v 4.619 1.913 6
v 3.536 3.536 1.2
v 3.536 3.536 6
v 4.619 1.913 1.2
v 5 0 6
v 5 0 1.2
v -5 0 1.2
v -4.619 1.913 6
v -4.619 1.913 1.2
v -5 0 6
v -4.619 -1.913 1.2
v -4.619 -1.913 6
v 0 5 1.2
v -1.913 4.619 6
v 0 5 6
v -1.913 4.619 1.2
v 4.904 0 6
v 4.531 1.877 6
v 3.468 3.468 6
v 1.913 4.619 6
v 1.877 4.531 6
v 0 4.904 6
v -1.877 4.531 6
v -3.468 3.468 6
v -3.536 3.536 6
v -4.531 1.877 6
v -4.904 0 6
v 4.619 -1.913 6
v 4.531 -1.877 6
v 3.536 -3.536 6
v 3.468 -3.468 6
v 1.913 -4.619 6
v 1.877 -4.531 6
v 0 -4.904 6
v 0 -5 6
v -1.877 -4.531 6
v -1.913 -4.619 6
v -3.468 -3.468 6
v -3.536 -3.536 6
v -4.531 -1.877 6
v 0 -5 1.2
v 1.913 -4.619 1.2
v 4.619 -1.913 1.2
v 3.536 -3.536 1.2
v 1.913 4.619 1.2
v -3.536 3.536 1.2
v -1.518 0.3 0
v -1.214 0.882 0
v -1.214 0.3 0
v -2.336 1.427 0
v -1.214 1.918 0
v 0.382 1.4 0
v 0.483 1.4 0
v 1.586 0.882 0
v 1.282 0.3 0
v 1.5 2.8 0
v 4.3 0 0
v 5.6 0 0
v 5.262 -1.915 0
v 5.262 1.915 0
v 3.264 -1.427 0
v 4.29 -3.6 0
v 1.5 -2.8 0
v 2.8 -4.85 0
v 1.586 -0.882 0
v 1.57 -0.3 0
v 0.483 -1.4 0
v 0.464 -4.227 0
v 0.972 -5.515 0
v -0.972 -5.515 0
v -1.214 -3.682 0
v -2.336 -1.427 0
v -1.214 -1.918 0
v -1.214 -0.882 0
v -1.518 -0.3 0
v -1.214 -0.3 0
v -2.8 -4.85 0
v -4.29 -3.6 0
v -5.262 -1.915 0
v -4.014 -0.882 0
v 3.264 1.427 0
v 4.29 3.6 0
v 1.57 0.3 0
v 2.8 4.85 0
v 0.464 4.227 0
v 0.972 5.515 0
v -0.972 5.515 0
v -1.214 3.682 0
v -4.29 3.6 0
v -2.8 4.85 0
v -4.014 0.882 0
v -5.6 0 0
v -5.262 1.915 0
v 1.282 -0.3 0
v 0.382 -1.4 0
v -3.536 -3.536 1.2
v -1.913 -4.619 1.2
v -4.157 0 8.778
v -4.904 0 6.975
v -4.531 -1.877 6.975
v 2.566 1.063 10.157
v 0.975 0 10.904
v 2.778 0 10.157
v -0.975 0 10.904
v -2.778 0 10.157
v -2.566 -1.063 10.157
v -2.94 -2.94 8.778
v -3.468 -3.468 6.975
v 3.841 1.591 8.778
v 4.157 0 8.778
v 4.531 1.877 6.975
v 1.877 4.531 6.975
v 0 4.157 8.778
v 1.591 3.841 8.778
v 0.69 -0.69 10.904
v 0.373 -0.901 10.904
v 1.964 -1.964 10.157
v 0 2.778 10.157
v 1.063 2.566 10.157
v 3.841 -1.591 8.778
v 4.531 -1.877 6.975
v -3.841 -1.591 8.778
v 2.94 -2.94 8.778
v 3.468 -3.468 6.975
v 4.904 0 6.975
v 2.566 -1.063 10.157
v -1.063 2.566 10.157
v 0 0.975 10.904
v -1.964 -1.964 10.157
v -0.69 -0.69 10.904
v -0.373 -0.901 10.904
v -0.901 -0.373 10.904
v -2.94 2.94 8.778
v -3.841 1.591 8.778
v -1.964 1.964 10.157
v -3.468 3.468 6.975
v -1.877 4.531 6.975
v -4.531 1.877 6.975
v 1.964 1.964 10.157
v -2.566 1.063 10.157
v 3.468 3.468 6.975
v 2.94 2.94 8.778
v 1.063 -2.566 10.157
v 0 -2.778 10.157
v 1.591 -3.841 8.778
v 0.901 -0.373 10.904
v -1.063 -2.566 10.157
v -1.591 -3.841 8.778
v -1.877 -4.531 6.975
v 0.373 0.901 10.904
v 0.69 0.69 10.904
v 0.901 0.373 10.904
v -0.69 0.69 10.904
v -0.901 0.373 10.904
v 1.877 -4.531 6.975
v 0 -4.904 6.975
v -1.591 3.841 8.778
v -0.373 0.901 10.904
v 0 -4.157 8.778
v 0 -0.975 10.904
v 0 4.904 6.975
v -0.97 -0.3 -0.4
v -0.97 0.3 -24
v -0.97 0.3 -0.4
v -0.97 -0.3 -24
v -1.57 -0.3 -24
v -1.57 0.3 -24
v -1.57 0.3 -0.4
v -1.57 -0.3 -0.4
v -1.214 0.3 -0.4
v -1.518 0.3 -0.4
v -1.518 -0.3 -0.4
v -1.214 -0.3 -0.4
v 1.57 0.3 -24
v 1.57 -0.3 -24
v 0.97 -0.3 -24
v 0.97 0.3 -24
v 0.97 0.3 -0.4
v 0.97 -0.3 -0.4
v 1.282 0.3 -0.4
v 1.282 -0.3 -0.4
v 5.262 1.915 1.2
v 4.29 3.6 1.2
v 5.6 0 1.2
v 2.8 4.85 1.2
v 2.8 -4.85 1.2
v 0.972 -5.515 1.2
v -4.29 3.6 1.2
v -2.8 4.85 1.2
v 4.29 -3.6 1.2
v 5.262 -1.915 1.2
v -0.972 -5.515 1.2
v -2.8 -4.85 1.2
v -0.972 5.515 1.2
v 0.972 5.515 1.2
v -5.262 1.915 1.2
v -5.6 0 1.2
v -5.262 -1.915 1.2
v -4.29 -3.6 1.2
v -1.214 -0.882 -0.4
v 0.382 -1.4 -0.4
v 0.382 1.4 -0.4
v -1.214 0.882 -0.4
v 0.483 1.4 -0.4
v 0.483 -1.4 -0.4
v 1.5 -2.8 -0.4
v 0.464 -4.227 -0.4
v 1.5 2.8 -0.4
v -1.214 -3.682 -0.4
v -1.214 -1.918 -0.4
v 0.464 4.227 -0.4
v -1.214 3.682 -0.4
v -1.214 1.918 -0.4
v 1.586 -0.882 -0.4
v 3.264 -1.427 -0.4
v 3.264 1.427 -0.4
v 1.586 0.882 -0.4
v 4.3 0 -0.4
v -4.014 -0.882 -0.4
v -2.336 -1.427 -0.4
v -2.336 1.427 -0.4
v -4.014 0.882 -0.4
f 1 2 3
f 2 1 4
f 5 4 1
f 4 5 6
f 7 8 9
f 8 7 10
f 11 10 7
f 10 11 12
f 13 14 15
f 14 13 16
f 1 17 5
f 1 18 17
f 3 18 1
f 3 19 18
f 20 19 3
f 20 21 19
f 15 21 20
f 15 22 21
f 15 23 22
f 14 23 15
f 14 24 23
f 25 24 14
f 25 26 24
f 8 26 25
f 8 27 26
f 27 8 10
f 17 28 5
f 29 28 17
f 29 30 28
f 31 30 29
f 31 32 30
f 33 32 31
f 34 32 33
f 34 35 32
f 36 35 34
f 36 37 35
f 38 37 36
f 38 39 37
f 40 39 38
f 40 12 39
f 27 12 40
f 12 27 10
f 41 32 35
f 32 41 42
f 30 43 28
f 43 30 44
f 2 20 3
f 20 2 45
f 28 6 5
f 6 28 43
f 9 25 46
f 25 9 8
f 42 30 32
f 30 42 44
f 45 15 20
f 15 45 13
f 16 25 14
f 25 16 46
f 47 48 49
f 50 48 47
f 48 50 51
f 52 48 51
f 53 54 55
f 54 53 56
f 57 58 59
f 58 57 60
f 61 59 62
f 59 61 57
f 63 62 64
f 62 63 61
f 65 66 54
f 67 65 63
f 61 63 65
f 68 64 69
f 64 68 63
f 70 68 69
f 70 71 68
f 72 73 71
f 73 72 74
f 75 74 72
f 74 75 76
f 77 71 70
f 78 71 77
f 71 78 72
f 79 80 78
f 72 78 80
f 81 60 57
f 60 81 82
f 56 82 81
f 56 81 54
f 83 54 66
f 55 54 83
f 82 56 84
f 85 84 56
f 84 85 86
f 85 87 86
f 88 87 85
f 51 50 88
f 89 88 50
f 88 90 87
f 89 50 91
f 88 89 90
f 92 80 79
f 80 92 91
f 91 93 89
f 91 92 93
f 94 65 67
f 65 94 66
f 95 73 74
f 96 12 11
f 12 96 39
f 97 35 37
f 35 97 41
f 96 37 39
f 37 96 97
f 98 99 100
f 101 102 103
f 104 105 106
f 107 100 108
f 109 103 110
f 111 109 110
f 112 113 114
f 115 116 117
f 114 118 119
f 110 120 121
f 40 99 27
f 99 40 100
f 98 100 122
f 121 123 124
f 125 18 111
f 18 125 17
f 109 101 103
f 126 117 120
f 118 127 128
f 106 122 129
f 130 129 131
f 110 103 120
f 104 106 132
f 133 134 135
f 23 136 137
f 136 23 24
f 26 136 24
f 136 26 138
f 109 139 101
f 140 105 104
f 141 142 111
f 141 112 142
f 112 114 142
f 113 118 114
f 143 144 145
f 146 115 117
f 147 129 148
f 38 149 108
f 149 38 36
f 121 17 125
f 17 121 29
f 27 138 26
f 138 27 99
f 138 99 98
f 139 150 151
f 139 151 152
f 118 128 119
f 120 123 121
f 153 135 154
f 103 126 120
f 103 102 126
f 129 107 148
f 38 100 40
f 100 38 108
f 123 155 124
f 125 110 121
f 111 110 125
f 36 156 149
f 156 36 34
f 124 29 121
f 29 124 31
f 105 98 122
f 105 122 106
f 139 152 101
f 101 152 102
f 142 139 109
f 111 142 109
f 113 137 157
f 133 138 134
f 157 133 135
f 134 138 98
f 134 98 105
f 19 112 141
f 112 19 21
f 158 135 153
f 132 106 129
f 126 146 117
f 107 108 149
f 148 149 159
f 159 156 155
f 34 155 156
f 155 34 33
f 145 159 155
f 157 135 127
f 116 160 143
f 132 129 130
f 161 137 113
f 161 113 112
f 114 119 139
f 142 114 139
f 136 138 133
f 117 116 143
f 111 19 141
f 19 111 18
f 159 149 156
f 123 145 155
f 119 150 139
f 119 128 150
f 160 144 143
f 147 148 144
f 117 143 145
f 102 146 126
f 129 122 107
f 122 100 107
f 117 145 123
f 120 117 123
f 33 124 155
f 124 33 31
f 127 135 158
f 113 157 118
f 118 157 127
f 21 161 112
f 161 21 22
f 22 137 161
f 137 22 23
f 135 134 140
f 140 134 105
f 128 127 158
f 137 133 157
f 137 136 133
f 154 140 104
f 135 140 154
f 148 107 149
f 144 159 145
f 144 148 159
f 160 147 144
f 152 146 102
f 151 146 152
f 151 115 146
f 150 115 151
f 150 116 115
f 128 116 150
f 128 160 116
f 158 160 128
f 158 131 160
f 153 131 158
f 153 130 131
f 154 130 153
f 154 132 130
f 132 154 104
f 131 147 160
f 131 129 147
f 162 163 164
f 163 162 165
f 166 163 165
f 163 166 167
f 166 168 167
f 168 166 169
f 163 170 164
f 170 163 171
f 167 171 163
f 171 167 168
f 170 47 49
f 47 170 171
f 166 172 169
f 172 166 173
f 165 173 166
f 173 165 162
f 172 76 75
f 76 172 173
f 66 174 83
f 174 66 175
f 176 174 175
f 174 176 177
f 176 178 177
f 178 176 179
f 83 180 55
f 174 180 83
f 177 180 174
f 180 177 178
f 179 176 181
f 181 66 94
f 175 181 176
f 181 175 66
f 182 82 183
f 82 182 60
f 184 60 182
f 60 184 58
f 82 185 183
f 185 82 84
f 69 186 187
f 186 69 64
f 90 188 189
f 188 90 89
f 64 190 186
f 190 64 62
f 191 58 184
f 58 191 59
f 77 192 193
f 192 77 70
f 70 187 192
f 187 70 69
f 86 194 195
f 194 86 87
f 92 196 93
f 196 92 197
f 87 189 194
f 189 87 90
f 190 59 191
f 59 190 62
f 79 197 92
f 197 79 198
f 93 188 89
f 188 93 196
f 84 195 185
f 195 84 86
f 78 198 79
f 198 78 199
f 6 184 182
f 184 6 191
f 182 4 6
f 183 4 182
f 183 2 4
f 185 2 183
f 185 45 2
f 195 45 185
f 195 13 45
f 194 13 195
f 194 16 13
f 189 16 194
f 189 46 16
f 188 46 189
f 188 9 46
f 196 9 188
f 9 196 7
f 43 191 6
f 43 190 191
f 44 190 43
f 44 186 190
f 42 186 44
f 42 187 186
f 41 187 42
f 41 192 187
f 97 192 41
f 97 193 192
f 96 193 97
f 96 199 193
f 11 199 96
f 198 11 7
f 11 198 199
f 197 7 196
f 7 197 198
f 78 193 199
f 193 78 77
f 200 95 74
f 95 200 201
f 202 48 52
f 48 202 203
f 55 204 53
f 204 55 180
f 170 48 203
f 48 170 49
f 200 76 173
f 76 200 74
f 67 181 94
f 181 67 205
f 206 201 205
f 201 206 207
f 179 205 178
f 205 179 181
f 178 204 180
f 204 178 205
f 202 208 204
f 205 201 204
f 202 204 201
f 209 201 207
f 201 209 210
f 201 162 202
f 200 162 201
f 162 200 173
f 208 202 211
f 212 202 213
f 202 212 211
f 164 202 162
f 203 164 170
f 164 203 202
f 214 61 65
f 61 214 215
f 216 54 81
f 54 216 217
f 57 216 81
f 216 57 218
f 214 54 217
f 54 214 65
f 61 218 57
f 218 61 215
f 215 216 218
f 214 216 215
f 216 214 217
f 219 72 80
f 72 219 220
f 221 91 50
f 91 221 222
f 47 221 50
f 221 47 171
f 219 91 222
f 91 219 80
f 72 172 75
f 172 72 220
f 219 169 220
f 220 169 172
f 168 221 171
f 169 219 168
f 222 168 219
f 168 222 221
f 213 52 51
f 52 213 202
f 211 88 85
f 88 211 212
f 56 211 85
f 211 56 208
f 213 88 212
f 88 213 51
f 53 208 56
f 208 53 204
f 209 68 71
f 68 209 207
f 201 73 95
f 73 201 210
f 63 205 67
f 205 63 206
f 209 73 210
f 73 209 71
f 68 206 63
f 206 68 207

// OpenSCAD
// Parameters
led_diameter_mm = 10; //[5:20:0.1]
body_height_mm = 11; //[5.5:22:0.1]
through_hole = 1; //[0:1:1]
lead_count = 2; //[2:2:1]
lead_length_mm = 25; //[10:60:1]
lead_pitch_mm = 2.54; //[1.27:7.62:0.01]
lead_thickness_mm = 0.6; //[0.3:1.2:0.05]
rim_thickness_mm = 1.2; //[0.6:2.4:0.05]
rim_diameter_mm = 11.2; //[10.2:22.4:0.1]
lens_round_radius_mm = 5; //[2.5:10:0.1]
lead_overlap_mm = 1; //[0.5:2:0.1]
grill_width_mm = 20; //[10:40:1]
grill_height_mm = 20; //[10:40:1]
grill_hole_mm = 3; //[1.5:6:0.1]
grill_gap_mm = 2; //[1:6:0.1]
grill_r_mm = 1000; //[20:2000:1]
grill_post_height_mm = 1.5; //[0.8:4:0.1]
grill_attach_overlap_mm = 1; //[0.5:2:0.1]

// LED Module
module led() {
  color("red") {
    // LED Body
    union() {
      translate([0, 0, (body_height_mm - lens_round_radius_mm) / 2])
        cylinder(r=led_diameter_mm/2, h=body_height_mm - lens_round_radius_mm, center=true);
      translate([0, 0, body_height_mm - led_diameter_mm/2])
        sphere(r=led_diameter_mm/2, center=true);
    }
    // Rim Flange
    translate([0, 0, rim_thickness_mm/2])
      cylinder(r=rim_diameter_mm/2, h=rim_thickness_mm, center=true);
    // Leads
    union() {
      translate([-lead_pitch_mm/2, 0, -lead_length_mm/2 + lead_overlap_mm])
        cube([lead_thickness_mm, lead_thickness_mm, lead_length_mm], center=true);
      translate([lead_pitch_mm/2, 0, -lead_length_mm/2 + lead_overlap_mm])
        cube([lead_thickness_mm, lead_thickness_mm, lead_length_mm], center=true);
    }
  }
}

// Grill Hole Positions Module
module grill_hole_positions() {
  color("gray") {
    union() {
      translate([0, 0, rim_thickness_mm/2 + grill_post_height_mm/2 - grill_attach_overlap_mm])
        cylinder(r=grill_hole_mm/2, h=grill_post_height_mm, center=true);
      translate([min(grill_width_mm/4, rim_diameter_mm/4), 0, rim_thickness_mm/2 + grill_post_height_mm/2 - grill_attach_overlap_mm])
        cylinder(r=grill_hole_mm/2, h=grill_post_height_mm, center=true);
      translate([-min(grill_width_mm/4, rim_diameter_mm/4), 0, rim_thickness_mm/2 + grill_post_height_mm/2 - grill_attach_overlap_mm])
        cylinder(r=grill_hole_mm/2, h=grill_post_height_mm, center=true);
      translate([0, min(grill_height_mm/4, rim_diameter_mm/4), rim_thickness_mm/2 + grill_post_height_mm/2 - grill_attach_overlap_mm])
        cylinder(r=grill_hole_mm/2, h=grill_post_height_mm, center=true);
      translate([0, -min(grill_height_mm/4, rim_diameter_mm/4), rim_thickness_mm/2 + grill_post_height_mm/2 - grill_attach_overlap_mm])
        cylinder(r=grill_hole_mm/2, h=grill_post_height_mm, center=true);
    }
  }
}

// Assembly Module
module assembly() {
  led();
  grill_hole_positions();
}

// Final Assembly Call
assembly();
